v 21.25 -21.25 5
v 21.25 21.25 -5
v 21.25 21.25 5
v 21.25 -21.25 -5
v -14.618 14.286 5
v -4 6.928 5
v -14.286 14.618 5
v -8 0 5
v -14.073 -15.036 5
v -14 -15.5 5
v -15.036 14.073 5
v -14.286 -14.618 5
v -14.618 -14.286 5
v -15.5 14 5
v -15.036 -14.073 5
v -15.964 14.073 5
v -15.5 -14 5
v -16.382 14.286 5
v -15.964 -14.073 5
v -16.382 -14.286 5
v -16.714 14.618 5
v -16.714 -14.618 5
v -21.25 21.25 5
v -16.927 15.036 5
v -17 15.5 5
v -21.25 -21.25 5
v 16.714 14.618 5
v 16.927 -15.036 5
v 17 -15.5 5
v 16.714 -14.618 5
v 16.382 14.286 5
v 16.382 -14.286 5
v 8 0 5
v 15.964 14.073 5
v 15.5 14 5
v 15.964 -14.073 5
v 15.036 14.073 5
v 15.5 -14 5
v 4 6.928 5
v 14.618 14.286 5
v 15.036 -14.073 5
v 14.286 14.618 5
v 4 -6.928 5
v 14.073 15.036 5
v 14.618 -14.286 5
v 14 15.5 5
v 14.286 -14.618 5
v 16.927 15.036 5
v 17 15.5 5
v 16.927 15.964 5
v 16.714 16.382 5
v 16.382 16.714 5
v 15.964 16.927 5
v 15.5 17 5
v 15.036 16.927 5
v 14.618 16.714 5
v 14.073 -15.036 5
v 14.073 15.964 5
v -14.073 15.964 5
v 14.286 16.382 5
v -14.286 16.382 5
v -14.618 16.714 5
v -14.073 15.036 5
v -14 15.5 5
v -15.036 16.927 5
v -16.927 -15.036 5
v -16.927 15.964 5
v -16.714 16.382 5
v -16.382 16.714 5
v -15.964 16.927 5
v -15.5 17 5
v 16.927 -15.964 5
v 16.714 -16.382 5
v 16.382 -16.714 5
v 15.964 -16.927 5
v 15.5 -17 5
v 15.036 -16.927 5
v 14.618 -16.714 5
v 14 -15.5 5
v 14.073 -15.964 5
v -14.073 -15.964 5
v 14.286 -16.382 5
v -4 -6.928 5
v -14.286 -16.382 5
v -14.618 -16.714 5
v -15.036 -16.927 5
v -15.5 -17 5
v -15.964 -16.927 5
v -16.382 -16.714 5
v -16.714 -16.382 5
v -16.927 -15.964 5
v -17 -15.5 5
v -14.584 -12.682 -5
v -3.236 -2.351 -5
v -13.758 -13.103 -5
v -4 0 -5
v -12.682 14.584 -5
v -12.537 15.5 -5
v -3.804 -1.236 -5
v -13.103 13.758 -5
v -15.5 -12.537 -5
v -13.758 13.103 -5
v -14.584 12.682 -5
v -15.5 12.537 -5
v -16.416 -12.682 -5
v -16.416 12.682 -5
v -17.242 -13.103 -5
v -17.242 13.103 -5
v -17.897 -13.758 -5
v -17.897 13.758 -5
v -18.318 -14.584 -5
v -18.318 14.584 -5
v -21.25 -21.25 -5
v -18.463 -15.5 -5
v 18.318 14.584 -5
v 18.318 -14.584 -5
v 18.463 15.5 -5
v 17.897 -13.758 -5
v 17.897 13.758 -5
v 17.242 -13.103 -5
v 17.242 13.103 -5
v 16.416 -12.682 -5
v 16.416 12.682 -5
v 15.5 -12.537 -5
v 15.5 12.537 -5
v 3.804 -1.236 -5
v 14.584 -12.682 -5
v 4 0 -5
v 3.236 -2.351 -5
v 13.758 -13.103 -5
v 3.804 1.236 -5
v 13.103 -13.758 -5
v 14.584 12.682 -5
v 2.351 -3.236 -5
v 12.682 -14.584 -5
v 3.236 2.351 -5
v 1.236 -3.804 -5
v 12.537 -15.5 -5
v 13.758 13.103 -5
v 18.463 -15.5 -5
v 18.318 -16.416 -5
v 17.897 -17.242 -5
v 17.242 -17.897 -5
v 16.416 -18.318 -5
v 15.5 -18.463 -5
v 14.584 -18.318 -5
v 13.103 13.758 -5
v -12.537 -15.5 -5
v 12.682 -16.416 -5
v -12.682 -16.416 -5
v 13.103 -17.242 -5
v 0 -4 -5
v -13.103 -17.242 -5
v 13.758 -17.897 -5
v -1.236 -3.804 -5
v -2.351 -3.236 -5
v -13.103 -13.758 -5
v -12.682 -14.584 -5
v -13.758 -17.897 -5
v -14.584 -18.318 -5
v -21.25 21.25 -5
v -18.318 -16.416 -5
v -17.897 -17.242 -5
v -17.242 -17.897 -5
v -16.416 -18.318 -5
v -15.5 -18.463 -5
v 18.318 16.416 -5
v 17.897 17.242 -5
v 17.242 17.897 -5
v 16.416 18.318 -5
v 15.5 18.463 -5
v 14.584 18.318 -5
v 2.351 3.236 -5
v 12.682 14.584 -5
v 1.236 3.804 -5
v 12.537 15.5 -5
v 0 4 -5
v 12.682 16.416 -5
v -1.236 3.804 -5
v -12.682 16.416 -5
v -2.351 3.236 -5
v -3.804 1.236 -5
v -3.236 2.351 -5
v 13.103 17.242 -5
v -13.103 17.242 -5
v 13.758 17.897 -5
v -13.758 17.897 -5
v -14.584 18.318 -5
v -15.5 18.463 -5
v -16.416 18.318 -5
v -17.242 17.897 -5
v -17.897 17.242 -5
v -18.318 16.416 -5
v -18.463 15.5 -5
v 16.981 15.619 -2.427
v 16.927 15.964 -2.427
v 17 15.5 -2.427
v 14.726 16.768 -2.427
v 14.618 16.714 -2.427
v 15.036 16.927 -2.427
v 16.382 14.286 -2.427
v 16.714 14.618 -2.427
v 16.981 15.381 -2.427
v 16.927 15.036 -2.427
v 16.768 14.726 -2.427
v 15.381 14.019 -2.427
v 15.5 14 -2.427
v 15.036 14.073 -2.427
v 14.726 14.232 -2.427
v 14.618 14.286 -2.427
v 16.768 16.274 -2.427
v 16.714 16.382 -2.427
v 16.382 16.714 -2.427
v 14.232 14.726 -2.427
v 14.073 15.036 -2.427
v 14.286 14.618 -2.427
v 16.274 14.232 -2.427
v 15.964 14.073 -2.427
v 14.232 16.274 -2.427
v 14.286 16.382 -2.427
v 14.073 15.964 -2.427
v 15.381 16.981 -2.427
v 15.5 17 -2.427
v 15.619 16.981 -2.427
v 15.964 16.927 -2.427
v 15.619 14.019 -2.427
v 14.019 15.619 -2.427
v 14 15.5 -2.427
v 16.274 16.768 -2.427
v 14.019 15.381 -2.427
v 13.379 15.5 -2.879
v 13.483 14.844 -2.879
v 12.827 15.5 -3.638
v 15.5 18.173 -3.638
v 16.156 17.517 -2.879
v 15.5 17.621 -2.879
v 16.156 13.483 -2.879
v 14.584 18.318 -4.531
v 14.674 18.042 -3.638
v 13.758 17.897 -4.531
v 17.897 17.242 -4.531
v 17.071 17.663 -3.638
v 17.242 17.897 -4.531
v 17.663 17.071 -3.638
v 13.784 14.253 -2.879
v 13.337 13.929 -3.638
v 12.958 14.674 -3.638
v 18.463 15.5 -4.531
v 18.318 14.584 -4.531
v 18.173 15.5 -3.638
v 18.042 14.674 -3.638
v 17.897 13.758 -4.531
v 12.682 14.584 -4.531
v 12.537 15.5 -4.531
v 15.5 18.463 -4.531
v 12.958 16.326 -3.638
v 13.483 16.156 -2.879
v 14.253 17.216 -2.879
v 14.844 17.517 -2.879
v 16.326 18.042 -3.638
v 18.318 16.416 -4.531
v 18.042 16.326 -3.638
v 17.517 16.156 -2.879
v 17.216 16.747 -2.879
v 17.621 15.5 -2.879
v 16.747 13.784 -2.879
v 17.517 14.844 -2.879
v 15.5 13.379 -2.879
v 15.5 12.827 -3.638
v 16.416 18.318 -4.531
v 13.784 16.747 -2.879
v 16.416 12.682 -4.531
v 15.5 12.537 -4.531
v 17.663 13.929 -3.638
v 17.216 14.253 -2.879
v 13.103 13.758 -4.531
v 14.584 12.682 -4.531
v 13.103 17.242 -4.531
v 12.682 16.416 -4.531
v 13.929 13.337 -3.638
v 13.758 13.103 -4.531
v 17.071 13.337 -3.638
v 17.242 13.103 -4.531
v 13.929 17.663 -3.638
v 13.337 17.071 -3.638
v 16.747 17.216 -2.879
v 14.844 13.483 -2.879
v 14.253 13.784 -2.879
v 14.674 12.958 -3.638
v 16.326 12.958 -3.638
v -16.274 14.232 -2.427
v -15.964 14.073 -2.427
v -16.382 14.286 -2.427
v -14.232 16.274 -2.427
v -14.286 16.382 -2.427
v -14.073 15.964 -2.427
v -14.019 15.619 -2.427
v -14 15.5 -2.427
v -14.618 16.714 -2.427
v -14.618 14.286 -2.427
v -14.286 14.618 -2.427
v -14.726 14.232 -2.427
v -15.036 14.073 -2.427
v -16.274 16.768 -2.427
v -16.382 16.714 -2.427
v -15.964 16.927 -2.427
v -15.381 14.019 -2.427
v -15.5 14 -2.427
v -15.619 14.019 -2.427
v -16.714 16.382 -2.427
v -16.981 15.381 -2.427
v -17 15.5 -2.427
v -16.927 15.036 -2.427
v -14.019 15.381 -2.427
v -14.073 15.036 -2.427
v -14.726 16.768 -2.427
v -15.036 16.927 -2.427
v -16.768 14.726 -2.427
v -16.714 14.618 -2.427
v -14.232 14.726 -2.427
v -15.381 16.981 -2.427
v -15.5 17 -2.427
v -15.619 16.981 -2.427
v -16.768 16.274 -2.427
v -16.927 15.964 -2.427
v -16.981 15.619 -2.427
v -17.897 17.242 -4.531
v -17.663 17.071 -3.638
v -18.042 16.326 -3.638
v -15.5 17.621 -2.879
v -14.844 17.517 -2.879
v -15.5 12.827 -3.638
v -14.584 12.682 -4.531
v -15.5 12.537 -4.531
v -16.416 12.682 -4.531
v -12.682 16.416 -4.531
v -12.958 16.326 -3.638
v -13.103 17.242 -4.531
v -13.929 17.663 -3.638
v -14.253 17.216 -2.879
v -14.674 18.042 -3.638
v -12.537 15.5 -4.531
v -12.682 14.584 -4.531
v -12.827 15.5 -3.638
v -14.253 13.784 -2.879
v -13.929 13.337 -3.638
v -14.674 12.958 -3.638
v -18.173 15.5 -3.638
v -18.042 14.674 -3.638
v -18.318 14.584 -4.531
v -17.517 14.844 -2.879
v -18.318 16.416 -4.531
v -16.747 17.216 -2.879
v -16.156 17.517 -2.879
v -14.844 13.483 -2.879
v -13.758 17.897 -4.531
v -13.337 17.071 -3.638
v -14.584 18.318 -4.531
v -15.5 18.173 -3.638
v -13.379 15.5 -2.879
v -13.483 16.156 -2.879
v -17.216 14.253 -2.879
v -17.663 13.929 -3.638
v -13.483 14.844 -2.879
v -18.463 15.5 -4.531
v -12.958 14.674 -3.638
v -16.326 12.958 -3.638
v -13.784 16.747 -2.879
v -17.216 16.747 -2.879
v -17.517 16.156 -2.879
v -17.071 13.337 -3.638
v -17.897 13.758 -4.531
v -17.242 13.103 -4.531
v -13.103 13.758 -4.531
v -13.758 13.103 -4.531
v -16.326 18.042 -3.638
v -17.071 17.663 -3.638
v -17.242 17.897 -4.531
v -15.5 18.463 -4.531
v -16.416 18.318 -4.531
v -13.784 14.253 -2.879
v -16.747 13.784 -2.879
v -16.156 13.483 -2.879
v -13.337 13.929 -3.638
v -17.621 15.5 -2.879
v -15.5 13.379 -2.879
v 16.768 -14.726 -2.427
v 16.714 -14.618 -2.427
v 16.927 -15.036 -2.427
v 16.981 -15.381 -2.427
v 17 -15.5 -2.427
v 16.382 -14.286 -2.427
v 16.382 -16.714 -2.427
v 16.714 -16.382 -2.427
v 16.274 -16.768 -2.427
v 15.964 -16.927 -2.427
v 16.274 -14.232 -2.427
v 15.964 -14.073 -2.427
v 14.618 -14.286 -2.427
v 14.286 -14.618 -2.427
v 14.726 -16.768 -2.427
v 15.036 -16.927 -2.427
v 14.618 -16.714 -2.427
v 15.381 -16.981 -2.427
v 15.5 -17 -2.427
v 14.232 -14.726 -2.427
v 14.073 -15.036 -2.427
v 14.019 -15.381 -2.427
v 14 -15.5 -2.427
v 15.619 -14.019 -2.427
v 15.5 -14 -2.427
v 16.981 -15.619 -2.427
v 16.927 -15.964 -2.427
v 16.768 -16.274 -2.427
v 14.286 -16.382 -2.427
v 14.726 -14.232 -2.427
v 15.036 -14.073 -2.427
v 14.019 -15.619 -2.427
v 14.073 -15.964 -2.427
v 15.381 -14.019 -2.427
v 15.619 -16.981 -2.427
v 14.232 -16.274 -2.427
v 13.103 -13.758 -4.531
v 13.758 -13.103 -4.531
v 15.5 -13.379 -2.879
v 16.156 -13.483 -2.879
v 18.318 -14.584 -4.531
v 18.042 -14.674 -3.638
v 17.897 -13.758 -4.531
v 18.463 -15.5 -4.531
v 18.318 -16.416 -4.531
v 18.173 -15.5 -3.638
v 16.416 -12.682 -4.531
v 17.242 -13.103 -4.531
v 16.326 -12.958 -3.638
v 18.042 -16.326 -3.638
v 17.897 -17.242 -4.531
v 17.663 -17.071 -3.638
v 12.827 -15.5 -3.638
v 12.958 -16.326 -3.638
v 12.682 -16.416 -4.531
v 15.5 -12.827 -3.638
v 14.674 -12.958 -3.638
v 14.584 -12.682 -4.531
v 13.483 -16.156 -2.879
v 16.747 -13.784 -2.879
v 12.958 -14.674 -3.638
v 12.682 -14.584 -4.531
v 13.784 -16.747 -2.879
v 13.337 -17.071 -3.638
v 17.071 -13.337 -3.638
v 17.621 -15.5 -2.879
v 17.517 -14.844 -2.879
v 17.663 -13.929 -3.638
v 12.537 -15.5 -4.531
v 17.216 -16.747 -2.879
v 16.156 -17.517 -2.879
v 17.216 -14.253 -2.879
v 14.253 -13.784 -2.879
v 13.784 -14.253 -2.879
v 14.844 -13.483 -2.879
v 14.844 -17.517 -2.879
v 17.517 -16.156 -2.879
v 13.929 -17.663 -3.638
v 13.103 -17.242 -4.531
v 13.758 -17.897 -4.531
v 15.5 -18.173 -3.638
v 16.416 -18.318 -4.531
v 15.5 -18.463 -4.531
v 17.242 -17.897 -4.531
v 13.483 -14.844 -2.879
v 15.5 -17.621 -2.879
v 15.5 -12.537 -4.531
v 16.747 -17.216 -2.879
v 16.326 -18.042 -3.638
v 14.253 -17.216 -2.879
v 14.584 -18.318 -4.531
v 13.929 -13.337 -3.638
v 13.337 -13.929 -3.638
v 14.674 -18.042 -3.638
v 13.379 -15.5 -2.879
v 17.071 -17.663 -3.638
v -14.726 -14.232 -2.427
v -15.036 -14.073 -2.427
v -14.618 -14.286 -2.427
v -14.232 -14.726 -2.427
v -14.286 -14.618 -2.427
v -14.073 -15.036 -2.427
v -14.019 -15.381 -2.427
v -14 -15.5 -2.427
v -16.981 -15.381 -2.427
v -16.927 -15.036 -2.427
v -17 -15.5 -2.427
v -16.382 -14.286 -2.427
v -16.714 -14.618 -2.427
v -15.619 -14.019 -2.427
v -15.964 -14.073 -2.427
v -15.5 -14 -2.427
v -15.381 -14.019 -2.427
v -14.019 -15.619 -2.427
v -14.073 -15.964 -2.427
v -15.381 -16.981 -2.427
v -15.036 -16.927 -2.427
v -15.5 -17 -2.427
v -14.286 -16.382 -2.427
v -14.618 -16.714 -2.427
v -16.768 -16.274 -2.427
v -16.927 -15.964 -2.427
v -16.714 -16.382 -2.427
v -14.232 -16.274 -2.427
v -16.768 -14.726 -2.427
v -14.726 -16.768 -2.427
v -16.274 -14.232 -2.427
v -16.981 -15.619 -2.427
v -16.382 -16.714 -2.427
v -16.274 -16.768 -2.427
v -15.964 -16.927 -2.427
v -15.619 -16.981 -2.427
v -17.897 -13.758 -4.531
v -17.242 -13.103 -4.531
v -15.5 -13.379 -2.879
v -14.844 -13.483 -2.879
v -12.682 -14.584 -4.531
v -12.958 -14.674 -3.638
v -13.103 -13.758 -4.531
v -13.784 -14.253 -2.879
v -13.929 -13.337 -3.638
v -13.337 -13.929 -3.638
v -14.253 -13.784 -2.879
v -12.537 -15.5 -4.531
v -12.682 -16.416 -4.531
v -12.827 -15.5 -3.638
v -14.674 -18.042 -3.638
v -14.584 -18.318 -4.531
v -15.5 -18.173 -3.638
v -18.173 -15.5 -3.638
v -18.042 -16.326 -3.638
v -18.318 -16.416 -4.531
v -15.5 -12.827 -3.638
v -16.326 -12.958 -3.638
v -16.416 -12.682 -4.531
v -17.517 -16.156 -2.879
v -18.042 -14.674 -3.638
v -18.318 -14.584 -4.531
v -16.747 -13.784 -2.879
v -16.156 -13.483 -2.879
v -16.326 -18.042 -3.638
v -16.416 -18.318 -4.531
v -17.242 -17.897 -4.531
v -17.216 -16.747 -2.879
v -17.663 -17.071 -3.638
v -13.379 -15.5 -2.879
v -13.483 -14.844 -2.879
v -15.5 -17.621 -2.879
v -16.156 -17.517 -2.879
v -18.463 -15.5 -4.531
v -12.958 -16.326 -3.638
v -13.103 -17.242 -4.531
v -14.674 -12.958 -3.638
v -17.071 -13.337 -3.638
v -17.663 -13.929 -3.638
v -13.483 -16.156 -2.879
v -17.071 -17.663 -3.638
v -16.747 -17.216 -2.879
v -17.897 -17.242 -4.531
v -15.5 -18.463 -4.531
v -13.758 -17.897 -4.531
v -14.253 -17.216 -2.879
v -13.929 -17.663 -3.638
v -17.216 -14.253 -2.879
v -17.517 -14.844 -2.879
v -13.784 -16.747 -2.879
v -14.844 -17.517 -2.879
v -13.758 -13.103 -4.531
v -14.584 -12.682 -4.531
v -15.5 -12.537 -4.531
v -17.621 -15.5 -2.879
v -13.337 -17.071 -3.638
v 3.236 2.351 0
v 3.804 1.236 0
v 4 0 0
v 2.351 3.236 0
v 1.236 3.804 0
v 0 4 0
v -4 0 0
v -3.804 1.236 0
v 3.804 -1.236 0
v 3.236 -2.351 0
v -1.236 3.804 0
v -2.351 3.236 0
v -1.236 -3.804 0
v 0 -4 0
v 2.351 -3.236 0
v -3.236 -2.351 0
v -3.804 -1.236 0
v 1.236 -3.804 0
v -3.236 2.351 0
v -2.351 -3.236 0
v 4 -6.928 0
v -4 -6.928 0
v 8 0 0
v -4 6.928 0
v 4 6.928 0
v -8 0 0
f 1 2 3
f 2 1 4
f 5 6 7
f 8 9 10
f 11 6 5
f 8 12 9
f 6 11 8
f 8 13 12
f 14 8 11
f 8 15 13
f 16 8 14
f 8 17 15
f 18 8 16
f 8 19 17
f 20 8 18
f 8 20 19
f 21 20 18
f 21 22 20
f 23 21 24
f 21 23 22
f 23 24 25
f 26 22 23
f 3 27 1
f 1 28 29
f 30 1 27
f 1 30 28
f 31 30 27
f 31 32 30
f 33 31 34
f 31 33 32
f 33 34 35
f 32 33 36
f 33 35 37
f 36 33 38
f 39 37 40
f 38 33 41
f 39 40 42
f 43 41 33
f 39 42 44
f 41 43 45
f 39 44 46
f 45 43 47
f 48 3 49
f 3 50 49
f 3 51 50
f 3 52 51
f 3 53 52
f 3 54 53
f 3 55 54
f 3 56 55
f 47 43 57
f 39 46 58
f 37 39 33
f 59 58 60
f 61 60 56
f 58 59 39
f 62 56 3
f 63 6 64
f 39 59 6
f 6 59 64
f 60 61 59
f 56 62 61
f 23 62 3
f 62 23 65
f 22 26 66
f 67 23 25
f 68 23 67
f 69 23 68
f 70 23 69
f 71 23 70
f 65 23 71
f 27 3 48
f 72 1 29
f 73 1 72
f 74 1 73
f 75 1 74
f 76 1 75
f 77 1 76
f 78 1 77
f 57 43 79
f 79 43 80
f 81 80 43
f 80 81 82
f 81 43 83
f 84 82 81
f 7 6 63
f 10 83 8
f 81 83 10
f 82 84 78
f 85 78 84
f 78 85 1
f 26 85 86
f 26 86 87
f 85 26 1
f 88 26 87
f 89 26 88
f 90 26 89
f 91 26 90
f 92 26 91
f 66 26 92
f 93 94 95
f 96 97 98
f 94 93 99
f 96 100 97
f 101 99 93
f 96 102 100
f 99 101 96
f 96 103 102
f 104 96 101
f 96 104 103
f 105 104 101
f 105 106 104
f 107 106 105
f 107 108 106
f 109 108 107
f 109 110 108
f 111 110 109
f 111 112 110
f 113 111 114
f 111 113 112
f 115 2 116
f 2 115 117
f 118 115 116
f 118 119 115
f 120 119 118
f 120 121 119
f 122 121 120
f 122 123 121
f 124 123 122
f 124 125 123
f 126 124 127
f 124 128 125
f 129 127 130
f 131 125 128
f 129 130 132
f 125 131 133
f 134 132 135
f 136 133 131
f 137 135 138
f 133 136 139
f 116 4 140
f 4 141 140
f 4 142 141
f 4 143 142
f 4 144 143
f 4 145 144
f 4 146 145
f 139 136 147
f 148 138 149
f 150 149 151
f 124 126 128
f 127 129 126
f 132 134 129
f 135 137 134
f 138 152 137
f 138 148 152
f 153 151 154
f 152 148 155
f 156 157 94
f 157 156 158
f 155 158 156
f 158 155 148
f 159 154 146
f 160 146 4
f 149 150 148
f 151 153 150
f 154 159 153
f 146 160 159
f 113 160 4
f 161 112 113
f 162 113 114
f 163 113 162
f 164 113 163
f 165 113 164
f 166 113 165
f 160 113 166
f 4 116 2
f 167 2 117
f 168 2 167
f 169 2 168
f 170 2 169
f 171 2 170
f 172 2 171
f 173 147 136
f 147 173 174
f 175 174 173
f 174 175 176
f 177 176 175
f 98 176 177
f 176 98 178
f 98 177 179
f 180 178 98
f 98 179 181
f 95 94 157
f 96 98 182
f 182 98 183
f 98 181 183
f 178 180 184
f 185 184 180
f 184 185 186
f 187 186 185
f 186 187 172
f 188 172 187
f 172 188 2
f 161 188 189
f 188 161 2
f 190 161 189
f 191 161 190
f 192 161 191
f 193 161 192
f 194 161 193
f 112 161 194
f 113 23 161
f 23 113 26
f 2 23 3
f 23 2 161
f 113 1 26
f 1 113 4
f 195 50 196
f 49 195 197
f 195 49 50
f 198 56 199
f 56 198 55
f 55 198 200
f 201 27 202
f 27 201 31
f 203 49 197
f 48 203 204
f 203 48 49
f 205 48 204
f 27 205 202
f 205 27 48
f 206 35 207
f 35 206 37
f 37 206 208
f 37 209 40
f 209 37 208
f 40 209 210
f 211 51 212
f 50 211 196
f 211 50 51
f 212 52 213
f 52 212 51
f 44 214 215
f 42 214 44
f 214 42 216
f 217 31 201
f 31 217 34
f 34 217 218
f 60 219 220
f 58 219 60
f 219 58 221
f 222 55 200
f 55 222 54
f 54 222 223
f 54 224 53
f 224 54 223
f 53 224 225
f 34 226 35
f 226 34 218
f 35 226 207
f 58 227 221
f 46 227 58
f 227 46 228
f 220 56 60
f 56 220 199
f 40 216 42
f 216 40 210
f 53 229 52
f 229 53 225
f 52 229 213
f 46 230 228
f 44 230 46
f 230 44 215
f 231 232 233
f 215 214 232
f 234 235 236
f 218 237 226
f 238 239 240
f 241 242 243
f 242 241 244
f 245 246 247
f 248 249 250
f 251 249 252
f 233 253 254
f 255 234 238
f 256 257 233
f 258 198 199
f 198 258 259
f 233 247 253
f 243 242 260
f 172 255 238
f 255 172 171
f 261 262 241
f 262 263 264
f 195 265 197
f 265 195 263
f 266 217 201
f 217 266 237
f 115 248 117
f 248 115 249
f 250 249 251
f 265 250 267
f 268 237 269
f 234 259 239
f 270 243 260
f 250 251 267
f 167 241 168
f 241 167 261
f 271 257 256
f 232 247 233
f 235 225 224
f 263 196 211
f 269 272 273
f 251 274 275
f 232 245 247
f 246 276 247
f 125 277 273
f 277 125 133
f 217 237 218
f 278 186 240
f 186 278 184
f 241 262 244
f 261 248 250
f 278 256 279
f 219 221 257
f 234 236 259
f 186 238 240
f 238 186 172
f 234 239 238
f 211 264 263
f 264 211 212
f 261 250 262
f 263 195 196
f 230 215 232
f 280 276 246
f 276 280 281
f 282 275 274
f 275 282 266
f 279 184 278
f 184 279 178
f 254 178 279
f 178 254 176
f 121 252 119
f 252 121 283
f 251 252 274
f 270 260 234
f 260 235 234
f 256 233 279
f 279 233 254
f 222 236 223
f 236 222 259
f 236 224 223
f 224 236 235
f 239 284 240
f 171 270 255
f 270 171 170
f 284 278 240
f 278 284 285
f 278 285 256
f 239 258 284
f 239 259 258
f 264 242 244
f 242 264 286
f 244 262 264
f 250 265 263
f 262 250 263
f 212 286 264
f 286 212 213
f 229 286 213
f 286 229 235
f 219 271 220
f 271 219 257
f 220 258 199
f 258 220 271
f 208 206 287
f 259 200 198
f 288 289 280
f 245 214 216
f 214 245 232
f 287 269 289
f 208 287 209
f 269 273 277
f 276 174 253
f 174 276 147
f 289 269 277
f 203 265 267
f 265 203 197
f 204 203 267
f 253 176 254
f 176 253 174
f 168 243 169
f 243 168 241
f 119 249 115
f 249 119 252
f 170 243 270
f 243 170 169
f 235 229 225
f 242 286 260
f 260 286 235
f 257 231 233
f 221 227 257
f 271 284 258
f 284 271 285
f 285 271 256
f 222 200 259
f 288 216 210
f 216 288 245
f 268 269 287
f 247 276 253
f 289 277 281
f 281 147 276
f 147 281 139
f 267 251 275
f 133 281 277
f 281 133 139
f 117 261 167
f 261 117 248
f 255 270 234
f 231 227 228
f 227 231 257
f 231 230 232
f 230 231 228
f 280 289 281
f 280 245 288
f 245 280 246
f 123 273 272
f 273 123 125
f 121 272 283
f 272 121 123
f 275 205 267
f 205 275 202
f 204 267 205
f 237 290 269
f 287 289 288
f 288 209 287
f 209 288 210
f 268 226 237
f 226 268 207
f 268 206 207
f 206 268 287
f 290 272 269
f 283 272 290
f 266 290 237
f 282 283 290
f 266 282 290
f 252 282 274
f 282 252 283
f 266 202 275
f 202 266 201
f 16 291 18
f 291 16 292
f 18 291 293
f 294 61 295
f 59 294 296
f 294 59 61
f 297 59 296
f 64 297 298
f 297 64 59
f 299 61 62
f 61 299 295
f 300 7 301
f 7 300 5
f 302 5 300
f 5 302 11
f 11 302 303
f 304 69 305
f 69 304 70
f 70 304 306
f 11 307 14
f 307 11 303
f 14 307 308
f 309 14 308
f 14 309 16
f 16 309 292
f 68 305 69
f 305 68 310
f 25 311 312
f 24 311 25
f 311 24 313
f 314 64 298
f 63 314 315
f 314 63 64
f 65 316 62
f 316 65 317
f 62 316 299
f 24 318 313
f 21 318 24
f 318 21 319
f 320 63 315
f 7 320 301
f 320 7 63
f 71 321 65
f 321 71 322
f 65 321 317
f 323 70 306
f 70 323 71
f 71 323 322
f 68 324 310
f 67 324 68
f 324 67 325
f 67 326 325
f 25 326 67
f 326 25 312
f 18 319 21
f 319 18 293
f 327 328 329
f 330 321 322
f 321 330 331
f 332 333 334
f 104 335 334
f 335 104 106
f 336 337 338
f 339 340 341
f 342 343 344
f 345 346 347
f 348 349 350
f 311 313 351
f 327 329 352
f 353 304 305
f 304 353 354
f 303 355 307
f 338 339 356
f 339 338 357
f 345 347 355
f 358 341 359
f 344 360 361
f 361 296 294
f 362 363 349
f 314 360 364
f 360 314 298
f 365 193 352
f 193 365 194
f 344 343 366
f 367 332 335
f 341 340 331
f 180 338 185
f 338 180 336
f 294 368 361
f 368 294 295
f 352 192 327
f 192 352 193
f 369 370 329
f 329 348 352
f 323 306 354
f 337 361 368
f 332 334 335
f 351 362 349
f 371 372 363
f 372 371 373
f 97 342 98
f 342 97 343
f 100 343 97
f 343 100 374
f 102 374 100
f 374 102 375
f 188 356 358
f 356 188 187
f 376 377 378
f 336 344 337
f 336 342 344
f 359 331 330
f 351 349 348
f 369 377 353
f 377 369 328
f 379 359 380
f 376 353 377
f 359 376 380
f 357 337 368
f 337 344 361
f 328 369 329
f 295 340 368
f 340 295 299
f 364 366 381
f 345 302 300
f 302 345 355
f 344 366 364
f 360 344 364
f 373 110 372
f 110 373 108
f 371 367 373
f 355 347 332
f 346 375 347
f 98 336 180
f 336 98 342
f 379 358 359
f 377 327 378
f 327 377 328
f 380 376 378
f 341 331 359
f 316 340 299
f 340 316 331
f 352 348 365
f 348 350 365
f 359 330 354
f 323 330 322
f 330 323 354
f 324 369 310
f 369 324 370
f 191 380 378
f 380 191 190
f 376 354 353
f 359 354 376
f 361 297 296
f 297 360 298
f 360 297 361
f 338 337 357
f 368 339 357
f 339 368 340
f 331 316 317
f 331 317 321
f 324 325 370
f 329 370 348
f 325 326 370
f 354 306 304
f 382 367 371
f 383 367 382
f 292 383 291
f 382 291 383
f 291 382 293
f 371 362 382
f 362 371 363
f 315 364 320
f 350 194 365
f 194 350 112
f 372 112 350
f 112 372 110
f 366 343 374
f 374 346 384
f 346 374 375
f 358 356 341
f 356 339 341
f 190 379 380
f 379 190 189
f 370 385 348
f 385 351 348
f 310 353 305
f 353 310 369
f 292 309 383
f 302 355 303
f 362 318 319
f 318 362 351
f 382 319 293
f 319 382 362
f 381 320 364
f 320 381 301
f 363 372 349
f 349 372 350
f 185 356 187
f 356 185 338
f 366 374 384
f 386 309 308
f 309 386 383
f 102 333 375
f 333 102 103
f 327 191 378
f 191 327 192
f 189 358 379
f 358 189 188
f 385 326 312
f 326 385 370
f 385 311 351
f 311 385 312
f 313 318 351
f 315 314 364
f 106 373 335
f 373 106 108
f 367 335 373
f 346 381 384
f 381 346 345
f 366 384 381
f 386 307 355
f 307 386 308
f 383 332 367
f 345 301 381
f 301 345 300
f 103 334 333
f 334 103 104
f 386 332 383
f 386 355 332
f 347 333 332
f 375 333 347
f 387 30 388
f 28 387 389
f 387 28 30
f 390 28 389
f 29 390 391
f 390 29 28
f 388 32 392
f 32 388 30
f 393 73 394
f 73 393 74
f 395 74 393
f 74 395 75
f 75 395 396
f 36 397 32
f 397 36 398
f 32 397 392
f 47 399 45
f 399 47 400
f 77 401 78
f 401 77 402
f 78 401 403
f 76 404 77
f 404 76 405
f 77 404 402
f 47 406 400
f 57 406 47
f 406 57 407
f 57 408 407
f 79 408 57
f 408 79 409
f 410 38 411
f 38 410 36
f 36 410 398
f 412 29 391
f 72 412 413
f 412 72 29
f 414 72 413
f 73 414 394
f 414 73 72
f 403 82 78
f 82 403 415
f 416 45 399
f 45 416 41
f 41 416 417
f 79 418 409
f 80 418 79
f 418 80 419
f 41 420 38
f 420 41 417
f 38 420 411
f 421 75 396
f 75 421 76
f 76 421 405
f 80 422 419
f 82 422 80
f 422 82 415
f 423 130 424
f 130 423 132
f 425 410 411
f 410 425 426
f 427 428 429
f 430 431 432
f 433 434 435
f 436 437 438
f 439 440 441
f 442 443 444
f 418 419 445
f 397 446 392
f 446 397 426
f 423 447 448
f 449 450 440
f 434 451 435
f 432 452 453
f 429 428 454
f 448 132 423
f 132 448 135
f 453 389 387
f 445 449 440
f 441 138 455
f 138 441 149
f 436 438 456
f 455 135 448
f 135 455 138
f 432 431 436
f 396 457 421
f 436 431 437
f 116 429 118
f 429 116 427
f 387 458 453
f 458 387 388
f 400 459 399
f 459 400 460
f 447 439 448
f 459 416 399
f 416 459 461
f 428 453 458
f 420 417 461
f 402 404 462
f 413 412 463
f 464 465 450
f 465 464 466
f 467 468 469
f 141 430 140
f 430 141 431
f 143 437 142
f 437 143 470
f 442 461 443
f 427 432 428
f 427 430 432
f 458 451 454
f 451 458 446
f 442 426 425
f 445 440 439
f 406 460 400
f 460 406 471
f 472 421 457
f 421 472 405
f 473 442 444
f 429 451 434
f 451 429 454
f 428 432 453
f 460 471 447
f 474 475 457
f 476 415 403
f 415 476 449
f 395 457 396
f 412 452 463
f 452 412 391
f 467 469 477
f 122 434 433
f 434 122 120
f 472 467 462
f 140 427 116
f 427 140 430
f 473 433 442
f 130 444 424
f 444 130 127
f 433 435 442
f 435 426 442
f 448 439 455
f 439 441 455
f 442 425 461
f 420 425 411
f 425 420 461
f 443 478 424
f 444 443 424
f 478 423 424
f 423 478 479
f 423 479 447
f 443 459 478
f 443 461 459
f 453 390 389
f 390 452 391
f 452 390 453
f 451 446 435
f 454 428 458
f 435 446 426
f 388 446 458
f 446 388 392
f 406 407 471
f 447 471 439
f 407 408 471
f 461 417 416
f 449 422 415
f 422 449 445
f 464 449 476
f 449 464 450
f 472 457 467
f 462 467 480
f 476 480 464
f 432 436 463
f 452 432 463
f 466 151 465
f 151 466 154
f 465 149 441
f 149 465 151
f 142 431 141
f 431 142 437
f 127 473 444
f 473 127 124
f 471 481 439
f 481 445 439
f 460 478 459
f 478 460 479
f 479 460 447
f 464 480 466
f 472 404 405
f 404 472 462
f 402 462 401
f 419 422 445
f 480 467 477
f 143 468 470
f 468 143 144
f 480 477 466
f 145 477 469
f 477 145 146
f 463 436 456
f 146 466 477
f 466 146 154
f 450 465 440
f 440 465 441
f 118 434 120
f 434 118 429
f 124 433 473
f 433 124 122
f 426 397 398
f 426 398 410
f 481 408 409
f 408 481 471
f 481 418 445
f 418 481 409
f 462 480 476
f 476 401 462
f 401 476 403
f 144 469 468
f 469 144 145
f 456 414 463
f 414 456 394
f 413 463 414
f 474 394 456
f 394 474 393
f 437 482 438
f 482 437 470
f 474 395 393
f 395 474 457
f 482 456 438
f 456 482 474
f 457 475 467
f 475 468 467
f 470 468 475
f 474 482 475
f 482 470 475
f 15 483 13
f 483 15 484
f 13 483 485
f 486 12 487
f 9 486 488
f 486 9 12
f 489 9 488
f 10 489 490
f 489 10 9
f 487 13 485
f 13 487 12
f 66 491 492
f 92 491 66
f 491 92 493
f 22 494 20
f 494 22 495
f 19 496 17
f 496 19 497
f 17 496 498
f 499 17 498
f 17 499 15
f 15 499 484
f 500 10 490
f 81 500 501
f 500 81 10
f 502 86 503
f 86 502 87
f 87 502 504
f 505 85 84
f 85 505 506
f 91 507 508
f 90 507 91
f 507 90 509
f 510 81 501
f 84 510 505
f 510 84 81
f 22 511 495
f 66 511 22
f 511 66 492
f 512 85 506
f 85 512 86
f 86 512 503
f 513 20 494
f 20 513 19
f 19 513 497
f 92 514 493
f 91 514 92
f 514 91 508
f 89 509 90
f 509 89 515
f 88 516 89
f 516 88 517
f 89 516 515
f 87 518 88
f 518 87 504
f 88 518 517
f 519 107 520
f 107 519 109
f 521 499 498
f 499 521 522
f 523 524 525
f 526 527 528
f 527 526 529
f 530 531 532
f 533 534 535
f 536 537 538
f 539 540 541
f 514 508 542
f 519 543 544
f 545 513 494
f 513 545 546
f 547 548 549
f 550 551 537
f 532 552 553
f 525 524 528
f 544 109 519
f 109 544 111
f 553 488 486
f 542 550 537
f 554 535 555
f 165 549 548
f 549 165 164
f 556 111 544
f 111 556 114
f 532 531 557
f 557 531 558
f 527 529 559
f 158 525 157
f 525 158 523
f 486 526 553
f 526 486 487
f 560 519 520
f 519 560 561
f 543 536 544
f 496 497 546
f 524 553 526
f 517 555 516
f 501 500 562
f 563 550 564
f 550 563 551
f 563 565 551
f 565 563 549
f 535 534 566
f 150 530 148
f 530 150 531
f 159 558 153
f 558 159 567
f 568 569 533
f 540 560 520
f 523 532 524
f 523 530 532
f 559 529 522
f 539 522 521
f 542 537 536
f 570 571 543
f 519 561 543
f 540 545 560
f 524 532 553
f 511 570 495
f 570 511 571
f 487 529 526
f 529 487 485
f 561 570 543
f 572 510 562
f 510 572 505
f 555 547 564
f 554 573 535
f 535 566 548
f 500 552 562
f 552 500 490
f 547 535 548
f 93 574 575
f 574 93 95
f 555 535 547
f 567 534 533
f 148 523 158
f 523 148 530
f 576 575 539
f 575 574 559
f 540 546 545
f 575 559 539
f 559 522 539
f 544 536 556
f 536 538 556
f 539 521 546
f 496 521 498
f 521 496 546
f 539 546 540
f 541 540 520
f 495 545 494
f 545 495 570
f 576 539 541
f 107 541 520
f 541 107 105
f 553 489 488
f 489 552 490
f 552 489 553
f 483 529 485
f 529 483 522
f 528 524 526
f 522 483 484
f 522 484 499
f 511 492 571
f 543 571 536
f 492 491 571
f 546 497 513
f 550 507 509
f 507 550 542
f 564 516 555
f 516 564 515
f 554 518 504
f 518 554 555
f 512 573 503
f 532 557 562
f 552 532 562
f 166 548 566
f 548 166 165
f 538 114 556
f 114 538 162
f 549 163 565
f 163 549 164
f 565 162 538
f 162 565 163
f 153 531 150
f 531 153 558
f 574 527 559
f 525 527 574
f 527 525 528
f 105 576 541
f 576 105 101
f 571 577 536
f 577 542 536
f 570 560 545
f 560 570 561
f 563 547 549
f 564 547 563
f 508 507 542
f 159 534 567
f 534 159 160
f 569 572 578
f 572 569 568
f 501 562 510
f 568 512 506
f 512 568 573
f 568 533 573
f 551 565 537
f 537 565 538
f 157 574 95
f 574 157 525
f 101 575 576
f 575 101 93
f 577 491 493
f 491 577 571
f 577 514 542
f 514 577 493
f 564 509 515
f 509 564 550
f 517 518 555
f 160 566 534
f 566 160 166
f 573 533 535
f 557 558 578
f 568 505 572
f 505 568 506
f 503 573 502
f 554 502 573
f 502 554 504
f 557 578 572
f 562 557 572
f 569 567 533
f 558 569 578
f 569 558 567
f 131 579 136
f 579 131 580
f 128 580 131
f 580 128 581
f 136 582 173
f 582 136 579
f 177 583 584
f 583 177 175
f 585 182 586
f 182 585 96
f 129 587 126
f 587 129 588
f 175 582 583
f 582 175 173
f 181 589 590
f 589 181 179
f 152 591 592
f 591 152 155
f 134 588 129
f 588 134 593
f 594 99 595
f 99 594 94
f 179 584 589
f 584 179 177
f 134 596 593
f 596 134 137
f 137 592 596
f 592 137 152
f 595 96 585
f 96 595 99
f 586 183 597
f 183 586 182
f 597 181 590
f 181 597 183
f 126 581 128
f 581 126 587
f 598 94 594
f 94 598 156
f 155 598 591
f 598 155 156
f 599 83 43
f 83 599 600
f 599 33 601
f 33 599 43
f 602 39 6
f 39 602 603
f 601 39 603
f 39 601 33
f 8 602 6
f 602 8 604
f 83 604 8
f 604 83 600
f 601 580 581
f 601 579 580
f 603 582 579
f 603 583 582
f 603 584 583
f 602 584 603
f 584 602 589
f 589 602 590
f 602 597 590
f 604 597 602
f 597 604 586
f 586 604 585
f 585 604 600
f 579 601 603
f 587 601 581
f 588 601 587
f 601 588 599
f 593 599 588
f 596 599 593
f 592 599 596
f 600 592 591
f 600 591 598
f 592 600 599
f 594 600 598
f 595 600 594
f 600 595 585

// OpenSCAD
// file: veriables.scad
aluminum_width			= 20;
wall_thickness			= 3;
depth						= 20;
smooth_rod				= 10;
long_bearing_od			= 19;
long_bearing_length		= 29;
bearing_outer			= 22;
bearing_inner			= 8;
bearing_thick				= 7;
screw_diamiter			= 4;
motor_width				= 42.5;
motor_screw_space		= 31;

hotend_gap				= 6;
hotend_gap_dia			= 12;
hotend_top				= 3;
hotend_top_dia			= 16;

x_rod_spacing			= 60;

aluminum_plate_thick	= 3;
// main file
include <veriables.scad>;


$fn= 20;
rotate([0,0,0]) difference(){
	cube([motor_width,motor_width,10], center=true);
	translate([motor_screw_space/2,motor_screw_space/2,0]) cylinder(d=3, h=10, center=true);
	translate([motor_screw_space/2,motor_screw_space/2,-5]) sphere(d=6);
	translate([-motor_screw_space/2,motor_screw_space/2,0]) cylinder(d=3, h=10, center=true);
	translate([-motor_screw_space/2,motor_screw_space/2,-5]) sphere(d=6);
	translate([motor_screw_space/2,-motor_screw_space/2,0]) cylinder(d=3, h=10, center=true);
	translate([motor_screw_space/2,-motor_screw_space/2,-5]) sphere(d=6);
	translate([-motor_screw_space/2,-motor_screw_space/2,0]) cylinder(d=3, h=10, center=true);
	translate([-motor_screw_space/2,-motor_screw_space/2,-5]) sphere(d=6);
	cylinder(h=10, d=8, center=true);
	cylinder(h=10, d=16, $fn=6);
}
